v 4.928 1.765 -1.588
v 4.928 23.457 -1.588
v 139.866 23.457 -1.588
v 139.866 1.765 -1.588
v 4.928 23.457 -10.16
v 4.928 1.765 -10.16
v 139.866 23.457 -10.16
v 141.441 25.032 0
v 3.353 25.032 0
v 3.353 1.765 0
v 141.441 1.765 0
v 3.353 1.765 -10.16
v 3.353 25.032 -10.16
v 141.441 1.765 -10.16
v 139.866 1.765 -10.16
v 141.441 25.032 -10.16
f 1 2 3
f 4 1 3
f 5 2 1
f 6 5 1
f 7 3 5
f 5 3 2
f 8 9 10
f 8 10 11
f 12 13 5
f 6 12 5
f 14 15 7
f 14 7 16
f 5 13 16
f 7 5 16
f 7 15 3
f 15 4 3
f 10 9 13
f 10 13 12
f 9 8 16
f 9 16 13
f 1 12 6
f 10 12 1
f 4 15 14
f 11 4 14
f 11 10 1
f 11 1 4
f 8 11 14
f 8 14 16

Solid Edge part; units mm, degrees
sketch "Sketch1" plane through (0, 0, 0) normal (0, 0, 1) x (1, 0, 0)
  line L0 (141.4412, 25.0317) -> (3.3528, 25.0317)
  line L1 (3.3528, 25.0317) -> (3.3528, 1.7653)
  line L2 (3.3528, 1.7653) -> (141.4412, 1.7653)
  line L3 (141.4412, 1.7653) -> (141.4412, 25.0317)
extrude "Protrusion1" add sketch "Sketch1" against normal blind 1.5875
sketch "Sketch2" plane through (72.397, 13.3985, 0) normal (0, 0, 1) x (-1, 0, 0)
  line L0 (-69.0442, 11.6332) -> (-69.0442, -11.6332)
  line L1 (69.0442, -11.6332) -> (-69.0442, -11.6332)
  line L2 (69.0442, -11.6332) -> (69.0442, 11.6332)
  line L3 (67.4694, 11.6332) -> (69.0442, 11.6332)
  line L4 (67.4694, -10.0584) -> (67.4694, 11.6332)
  line L5 (-67.4694, -10.0584) -> (67.4694, -10.0584)
  line L6 (-67.4694, 11.6332) -> (-67.4694, -10.0584)
  line L7 (-69.0442, 11.6332) -> (-67.4694, 11.6332)
extrude "ExtrudedProtrusion_2" add sketch "Sketch2" against normal blind 10.16
